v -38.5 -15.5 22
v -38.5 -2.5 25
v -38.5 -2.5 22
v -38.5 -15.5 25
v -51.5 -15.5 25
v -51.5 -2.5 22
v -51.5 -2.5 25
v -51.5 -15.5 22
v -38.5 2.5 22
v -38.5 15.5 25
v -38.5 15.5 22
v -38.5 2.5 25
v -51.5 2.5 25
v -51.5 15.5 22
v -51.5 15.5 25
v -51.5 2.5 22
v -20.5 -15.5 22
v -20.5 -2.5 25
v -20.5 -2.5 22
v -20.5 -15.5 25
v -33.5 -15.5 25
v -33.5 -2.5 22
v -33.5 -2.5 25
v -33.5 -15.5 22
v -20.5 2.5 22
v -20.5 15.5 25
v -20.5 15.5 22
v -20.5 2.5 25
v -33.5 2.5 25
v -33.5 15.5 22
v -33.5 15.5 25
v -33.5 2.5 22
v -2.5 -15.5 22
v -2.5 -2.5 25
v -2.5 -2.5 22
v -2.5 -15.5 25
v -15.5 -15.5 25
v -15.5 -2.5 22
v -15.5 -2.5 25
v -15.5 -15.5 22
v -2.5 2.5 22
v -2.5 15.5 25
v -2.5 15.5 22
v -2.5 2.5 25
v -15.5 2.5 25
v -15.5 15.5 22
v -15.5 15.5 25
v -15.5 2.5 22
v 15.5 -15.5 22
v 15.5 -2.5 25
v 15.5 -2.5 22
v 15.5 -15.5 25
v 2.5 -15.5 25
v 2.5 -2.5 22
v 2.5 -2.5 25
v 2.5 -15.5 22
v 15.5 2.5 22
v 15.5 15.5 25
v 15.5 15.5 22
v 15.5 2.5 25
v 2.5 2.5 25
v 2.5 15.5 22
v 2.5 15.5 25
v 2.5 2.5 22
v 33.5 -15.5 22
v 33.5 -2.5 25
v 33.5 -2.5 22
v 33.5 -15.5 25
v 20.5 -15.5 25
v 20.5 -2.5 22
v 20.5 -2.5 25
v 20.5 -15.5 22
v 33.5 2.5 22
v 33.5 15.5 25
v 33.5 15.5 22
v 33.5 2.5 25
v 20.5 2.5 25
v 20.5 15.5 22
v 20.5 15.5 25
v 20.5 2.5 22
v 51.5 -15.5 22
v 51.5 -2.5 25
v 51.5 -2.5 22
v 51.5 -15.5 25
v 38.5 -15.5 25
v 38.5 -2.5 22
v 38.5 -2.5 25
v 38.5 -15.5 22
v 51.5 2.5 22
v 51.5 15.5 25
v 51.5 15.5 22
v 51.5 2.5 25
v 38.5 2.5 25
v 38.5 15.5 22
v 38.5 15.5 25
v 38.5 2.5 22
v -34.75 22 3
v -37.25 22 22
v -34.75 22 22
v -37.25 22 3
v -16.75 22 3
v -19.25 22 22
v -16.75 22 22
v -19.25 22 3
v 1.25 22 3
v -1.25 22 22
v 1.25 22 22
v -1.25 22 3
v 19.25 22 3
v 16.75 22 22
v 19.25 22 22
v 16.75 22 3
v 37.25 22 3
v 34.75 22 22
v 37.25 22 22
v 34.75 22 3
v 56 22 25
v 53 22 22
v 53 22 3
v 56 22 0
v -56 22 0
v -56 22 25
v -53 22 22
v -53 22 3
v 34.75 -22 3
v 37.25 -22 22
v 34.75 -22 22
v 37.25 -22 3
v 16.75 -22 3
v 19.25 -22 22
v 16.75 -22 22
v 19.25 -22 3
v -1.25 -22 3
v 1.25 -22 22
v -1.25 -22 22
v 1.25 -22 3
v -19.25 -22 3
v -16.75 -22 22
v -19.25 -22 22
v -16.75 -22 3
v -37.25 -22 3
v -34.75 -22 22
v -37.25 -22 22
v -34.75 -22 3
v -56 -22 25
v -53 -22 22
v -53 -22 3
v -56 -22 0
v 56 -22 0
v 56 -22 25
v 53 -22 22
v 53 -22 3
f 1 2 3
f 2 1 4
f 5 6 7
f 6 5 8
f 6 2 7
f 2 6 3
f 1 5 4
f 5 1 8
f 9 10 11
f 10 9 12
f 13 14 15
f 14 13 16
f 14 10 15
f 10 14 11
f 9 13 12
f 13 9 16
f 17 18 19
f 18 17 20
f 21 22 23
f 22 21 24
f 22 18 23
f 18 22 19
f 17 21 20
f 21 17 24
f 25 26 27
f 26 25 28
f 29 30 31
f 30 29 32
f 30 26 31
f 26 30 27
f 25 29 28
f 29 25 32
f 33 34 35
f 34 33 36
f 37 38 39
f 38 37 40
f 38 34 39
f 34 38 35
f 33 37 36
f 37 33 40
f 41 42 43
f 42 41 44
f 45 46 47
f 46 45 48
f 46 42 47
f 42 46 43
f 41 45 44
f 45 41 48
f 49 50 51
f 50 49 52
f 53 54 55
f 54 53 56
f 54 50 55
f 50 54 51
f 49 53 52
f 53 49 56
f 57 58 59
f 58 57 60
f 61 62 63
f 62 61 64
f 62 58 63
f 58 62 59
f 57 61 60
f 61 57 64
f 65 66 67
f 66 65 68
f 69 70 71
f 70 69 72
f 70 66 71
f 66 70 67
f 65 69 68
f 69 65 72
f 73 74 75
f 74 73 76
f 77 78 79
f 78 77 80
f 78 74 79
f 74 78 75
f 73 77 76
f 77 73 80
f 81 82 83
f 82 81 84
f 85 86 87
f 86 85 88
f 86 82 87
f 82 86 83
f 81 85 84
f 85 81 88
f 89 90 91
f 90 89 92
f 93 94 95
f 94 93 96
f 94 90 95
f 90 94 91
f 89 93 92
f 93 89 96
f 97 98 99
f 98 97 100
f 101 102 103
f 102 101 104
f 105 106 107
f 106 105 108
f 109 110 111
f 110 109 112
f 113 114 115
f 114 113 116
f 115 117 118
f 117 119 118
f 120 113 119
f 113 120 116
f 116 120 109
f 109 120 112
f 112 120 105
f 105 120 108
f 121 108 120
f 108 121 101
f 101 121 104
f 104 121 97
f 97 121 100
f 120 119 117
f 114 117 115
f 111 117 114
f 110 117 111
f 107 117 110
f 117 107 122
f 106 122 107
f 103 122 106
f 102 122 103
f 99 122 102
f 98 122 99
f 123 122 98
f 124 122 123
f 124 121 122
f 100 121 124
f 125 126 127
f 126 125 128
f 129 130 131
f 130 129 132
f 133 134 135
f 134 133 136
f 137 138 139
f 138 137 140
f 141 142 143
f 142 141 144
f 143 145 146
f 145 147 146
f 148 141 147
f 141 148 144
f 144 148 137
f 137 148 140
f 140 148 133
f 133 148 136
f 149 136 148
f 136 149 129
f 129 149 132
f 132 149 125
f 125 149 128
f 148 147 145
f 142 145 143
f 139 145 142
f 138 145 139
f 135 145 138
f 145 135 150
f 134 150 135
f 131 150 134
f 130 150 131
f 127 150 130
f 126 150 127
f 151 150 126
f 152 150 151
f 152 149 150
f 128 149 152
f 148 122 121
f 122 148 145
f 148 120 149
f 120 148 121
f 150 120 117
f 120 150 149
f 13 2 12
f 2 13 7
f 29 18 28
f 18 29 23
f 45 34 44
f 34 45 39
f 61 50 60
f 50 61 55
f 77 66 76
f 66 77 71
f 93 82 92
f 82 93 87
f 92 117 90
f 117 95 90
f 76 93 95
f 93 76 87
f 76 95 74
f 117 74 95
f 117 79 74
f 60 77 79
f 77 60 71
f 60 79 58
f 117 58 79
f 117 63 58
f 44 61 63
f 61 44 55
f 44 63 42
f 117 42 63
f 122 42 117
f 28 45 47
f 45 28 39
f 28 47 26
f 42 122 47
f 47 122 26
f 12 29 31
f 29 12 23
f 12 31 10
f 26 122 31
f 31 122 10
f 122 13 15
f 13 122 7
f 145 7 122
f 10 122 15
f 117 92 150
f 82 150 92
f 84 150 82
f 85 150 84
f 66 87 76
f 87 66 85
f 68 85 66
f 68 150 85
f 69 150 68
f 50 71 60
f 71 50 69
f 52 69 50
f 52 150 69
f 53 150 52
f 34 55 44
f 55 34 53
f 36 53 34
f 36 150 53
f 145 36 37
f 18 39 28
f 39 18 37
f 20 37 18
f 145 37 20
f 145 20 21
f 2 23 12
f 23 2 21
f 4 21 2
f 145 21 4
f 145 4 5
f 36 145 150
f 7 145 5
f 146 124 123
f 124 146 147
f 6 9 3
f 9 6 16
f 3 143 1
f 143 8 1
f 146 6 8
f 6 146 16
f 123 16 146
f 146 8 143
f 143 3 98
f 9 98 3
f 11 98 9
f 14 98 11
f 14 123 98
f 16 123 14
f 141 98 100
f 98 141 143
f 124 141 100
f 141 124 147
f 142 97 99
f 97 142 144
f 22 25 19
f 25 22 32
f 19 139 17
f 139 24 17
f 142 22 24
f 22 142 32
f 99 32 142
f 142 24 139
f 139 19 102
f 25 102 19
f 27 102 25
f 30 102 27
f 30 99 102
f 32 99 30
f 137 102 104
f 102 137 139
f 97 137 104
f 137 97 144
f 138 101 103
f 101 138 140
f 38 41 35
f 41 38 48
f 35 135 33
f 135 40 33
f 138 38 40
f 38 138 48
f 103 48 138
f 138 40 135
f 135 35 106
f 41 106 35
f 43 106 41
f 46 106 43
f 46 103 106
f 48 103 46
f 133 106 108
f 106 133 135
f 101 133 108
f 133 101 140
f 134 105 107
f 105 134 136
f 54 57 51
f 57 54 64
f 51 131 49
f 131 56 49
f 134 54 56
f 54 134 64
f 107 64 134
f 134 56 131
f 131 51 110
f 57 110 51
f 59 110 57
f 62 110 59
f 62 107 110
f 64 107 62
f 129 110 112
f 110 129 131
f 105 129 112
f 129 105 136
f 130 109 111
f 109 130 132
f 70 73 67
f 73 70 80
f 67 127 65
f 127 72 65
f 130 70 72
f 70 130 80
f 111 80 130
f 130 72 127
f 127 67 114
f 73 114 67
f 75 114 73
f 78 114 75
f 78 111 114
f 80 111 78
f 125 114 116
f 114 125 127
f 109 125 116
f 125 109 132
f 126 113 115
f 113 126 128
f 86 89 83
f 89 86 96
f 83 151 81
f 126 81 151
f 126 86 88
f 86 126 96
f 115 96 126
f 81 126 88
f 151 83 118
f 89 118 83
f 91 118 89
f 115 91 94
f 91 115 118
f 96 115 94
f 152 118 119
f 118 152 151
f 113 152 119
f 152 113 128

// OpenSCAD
// KNOWN-RIGHT ALTERNATIVE (must pass): a correct part coded independently, as one extruded side profile with the holes cut after
// one 2-D side profile extruded, then holes
difference(){ translate([0,22,0]) rotate([90,0,0]) linear_extrude(44) union(){ translate([-56,0]) square([112,3]); translate([-56,22]) square([112,3]);
   translate([-56,0]) square([3,25]); translate([53,0]) square([3,25]); for(x=[-36:18:36]) translate([x-1.25,0]) square([2.5,25]); }
 for(x=[-45:18:45], y=[-9,9]) translate([x,y,23.5]) cube([13,13,5],center=true); }
